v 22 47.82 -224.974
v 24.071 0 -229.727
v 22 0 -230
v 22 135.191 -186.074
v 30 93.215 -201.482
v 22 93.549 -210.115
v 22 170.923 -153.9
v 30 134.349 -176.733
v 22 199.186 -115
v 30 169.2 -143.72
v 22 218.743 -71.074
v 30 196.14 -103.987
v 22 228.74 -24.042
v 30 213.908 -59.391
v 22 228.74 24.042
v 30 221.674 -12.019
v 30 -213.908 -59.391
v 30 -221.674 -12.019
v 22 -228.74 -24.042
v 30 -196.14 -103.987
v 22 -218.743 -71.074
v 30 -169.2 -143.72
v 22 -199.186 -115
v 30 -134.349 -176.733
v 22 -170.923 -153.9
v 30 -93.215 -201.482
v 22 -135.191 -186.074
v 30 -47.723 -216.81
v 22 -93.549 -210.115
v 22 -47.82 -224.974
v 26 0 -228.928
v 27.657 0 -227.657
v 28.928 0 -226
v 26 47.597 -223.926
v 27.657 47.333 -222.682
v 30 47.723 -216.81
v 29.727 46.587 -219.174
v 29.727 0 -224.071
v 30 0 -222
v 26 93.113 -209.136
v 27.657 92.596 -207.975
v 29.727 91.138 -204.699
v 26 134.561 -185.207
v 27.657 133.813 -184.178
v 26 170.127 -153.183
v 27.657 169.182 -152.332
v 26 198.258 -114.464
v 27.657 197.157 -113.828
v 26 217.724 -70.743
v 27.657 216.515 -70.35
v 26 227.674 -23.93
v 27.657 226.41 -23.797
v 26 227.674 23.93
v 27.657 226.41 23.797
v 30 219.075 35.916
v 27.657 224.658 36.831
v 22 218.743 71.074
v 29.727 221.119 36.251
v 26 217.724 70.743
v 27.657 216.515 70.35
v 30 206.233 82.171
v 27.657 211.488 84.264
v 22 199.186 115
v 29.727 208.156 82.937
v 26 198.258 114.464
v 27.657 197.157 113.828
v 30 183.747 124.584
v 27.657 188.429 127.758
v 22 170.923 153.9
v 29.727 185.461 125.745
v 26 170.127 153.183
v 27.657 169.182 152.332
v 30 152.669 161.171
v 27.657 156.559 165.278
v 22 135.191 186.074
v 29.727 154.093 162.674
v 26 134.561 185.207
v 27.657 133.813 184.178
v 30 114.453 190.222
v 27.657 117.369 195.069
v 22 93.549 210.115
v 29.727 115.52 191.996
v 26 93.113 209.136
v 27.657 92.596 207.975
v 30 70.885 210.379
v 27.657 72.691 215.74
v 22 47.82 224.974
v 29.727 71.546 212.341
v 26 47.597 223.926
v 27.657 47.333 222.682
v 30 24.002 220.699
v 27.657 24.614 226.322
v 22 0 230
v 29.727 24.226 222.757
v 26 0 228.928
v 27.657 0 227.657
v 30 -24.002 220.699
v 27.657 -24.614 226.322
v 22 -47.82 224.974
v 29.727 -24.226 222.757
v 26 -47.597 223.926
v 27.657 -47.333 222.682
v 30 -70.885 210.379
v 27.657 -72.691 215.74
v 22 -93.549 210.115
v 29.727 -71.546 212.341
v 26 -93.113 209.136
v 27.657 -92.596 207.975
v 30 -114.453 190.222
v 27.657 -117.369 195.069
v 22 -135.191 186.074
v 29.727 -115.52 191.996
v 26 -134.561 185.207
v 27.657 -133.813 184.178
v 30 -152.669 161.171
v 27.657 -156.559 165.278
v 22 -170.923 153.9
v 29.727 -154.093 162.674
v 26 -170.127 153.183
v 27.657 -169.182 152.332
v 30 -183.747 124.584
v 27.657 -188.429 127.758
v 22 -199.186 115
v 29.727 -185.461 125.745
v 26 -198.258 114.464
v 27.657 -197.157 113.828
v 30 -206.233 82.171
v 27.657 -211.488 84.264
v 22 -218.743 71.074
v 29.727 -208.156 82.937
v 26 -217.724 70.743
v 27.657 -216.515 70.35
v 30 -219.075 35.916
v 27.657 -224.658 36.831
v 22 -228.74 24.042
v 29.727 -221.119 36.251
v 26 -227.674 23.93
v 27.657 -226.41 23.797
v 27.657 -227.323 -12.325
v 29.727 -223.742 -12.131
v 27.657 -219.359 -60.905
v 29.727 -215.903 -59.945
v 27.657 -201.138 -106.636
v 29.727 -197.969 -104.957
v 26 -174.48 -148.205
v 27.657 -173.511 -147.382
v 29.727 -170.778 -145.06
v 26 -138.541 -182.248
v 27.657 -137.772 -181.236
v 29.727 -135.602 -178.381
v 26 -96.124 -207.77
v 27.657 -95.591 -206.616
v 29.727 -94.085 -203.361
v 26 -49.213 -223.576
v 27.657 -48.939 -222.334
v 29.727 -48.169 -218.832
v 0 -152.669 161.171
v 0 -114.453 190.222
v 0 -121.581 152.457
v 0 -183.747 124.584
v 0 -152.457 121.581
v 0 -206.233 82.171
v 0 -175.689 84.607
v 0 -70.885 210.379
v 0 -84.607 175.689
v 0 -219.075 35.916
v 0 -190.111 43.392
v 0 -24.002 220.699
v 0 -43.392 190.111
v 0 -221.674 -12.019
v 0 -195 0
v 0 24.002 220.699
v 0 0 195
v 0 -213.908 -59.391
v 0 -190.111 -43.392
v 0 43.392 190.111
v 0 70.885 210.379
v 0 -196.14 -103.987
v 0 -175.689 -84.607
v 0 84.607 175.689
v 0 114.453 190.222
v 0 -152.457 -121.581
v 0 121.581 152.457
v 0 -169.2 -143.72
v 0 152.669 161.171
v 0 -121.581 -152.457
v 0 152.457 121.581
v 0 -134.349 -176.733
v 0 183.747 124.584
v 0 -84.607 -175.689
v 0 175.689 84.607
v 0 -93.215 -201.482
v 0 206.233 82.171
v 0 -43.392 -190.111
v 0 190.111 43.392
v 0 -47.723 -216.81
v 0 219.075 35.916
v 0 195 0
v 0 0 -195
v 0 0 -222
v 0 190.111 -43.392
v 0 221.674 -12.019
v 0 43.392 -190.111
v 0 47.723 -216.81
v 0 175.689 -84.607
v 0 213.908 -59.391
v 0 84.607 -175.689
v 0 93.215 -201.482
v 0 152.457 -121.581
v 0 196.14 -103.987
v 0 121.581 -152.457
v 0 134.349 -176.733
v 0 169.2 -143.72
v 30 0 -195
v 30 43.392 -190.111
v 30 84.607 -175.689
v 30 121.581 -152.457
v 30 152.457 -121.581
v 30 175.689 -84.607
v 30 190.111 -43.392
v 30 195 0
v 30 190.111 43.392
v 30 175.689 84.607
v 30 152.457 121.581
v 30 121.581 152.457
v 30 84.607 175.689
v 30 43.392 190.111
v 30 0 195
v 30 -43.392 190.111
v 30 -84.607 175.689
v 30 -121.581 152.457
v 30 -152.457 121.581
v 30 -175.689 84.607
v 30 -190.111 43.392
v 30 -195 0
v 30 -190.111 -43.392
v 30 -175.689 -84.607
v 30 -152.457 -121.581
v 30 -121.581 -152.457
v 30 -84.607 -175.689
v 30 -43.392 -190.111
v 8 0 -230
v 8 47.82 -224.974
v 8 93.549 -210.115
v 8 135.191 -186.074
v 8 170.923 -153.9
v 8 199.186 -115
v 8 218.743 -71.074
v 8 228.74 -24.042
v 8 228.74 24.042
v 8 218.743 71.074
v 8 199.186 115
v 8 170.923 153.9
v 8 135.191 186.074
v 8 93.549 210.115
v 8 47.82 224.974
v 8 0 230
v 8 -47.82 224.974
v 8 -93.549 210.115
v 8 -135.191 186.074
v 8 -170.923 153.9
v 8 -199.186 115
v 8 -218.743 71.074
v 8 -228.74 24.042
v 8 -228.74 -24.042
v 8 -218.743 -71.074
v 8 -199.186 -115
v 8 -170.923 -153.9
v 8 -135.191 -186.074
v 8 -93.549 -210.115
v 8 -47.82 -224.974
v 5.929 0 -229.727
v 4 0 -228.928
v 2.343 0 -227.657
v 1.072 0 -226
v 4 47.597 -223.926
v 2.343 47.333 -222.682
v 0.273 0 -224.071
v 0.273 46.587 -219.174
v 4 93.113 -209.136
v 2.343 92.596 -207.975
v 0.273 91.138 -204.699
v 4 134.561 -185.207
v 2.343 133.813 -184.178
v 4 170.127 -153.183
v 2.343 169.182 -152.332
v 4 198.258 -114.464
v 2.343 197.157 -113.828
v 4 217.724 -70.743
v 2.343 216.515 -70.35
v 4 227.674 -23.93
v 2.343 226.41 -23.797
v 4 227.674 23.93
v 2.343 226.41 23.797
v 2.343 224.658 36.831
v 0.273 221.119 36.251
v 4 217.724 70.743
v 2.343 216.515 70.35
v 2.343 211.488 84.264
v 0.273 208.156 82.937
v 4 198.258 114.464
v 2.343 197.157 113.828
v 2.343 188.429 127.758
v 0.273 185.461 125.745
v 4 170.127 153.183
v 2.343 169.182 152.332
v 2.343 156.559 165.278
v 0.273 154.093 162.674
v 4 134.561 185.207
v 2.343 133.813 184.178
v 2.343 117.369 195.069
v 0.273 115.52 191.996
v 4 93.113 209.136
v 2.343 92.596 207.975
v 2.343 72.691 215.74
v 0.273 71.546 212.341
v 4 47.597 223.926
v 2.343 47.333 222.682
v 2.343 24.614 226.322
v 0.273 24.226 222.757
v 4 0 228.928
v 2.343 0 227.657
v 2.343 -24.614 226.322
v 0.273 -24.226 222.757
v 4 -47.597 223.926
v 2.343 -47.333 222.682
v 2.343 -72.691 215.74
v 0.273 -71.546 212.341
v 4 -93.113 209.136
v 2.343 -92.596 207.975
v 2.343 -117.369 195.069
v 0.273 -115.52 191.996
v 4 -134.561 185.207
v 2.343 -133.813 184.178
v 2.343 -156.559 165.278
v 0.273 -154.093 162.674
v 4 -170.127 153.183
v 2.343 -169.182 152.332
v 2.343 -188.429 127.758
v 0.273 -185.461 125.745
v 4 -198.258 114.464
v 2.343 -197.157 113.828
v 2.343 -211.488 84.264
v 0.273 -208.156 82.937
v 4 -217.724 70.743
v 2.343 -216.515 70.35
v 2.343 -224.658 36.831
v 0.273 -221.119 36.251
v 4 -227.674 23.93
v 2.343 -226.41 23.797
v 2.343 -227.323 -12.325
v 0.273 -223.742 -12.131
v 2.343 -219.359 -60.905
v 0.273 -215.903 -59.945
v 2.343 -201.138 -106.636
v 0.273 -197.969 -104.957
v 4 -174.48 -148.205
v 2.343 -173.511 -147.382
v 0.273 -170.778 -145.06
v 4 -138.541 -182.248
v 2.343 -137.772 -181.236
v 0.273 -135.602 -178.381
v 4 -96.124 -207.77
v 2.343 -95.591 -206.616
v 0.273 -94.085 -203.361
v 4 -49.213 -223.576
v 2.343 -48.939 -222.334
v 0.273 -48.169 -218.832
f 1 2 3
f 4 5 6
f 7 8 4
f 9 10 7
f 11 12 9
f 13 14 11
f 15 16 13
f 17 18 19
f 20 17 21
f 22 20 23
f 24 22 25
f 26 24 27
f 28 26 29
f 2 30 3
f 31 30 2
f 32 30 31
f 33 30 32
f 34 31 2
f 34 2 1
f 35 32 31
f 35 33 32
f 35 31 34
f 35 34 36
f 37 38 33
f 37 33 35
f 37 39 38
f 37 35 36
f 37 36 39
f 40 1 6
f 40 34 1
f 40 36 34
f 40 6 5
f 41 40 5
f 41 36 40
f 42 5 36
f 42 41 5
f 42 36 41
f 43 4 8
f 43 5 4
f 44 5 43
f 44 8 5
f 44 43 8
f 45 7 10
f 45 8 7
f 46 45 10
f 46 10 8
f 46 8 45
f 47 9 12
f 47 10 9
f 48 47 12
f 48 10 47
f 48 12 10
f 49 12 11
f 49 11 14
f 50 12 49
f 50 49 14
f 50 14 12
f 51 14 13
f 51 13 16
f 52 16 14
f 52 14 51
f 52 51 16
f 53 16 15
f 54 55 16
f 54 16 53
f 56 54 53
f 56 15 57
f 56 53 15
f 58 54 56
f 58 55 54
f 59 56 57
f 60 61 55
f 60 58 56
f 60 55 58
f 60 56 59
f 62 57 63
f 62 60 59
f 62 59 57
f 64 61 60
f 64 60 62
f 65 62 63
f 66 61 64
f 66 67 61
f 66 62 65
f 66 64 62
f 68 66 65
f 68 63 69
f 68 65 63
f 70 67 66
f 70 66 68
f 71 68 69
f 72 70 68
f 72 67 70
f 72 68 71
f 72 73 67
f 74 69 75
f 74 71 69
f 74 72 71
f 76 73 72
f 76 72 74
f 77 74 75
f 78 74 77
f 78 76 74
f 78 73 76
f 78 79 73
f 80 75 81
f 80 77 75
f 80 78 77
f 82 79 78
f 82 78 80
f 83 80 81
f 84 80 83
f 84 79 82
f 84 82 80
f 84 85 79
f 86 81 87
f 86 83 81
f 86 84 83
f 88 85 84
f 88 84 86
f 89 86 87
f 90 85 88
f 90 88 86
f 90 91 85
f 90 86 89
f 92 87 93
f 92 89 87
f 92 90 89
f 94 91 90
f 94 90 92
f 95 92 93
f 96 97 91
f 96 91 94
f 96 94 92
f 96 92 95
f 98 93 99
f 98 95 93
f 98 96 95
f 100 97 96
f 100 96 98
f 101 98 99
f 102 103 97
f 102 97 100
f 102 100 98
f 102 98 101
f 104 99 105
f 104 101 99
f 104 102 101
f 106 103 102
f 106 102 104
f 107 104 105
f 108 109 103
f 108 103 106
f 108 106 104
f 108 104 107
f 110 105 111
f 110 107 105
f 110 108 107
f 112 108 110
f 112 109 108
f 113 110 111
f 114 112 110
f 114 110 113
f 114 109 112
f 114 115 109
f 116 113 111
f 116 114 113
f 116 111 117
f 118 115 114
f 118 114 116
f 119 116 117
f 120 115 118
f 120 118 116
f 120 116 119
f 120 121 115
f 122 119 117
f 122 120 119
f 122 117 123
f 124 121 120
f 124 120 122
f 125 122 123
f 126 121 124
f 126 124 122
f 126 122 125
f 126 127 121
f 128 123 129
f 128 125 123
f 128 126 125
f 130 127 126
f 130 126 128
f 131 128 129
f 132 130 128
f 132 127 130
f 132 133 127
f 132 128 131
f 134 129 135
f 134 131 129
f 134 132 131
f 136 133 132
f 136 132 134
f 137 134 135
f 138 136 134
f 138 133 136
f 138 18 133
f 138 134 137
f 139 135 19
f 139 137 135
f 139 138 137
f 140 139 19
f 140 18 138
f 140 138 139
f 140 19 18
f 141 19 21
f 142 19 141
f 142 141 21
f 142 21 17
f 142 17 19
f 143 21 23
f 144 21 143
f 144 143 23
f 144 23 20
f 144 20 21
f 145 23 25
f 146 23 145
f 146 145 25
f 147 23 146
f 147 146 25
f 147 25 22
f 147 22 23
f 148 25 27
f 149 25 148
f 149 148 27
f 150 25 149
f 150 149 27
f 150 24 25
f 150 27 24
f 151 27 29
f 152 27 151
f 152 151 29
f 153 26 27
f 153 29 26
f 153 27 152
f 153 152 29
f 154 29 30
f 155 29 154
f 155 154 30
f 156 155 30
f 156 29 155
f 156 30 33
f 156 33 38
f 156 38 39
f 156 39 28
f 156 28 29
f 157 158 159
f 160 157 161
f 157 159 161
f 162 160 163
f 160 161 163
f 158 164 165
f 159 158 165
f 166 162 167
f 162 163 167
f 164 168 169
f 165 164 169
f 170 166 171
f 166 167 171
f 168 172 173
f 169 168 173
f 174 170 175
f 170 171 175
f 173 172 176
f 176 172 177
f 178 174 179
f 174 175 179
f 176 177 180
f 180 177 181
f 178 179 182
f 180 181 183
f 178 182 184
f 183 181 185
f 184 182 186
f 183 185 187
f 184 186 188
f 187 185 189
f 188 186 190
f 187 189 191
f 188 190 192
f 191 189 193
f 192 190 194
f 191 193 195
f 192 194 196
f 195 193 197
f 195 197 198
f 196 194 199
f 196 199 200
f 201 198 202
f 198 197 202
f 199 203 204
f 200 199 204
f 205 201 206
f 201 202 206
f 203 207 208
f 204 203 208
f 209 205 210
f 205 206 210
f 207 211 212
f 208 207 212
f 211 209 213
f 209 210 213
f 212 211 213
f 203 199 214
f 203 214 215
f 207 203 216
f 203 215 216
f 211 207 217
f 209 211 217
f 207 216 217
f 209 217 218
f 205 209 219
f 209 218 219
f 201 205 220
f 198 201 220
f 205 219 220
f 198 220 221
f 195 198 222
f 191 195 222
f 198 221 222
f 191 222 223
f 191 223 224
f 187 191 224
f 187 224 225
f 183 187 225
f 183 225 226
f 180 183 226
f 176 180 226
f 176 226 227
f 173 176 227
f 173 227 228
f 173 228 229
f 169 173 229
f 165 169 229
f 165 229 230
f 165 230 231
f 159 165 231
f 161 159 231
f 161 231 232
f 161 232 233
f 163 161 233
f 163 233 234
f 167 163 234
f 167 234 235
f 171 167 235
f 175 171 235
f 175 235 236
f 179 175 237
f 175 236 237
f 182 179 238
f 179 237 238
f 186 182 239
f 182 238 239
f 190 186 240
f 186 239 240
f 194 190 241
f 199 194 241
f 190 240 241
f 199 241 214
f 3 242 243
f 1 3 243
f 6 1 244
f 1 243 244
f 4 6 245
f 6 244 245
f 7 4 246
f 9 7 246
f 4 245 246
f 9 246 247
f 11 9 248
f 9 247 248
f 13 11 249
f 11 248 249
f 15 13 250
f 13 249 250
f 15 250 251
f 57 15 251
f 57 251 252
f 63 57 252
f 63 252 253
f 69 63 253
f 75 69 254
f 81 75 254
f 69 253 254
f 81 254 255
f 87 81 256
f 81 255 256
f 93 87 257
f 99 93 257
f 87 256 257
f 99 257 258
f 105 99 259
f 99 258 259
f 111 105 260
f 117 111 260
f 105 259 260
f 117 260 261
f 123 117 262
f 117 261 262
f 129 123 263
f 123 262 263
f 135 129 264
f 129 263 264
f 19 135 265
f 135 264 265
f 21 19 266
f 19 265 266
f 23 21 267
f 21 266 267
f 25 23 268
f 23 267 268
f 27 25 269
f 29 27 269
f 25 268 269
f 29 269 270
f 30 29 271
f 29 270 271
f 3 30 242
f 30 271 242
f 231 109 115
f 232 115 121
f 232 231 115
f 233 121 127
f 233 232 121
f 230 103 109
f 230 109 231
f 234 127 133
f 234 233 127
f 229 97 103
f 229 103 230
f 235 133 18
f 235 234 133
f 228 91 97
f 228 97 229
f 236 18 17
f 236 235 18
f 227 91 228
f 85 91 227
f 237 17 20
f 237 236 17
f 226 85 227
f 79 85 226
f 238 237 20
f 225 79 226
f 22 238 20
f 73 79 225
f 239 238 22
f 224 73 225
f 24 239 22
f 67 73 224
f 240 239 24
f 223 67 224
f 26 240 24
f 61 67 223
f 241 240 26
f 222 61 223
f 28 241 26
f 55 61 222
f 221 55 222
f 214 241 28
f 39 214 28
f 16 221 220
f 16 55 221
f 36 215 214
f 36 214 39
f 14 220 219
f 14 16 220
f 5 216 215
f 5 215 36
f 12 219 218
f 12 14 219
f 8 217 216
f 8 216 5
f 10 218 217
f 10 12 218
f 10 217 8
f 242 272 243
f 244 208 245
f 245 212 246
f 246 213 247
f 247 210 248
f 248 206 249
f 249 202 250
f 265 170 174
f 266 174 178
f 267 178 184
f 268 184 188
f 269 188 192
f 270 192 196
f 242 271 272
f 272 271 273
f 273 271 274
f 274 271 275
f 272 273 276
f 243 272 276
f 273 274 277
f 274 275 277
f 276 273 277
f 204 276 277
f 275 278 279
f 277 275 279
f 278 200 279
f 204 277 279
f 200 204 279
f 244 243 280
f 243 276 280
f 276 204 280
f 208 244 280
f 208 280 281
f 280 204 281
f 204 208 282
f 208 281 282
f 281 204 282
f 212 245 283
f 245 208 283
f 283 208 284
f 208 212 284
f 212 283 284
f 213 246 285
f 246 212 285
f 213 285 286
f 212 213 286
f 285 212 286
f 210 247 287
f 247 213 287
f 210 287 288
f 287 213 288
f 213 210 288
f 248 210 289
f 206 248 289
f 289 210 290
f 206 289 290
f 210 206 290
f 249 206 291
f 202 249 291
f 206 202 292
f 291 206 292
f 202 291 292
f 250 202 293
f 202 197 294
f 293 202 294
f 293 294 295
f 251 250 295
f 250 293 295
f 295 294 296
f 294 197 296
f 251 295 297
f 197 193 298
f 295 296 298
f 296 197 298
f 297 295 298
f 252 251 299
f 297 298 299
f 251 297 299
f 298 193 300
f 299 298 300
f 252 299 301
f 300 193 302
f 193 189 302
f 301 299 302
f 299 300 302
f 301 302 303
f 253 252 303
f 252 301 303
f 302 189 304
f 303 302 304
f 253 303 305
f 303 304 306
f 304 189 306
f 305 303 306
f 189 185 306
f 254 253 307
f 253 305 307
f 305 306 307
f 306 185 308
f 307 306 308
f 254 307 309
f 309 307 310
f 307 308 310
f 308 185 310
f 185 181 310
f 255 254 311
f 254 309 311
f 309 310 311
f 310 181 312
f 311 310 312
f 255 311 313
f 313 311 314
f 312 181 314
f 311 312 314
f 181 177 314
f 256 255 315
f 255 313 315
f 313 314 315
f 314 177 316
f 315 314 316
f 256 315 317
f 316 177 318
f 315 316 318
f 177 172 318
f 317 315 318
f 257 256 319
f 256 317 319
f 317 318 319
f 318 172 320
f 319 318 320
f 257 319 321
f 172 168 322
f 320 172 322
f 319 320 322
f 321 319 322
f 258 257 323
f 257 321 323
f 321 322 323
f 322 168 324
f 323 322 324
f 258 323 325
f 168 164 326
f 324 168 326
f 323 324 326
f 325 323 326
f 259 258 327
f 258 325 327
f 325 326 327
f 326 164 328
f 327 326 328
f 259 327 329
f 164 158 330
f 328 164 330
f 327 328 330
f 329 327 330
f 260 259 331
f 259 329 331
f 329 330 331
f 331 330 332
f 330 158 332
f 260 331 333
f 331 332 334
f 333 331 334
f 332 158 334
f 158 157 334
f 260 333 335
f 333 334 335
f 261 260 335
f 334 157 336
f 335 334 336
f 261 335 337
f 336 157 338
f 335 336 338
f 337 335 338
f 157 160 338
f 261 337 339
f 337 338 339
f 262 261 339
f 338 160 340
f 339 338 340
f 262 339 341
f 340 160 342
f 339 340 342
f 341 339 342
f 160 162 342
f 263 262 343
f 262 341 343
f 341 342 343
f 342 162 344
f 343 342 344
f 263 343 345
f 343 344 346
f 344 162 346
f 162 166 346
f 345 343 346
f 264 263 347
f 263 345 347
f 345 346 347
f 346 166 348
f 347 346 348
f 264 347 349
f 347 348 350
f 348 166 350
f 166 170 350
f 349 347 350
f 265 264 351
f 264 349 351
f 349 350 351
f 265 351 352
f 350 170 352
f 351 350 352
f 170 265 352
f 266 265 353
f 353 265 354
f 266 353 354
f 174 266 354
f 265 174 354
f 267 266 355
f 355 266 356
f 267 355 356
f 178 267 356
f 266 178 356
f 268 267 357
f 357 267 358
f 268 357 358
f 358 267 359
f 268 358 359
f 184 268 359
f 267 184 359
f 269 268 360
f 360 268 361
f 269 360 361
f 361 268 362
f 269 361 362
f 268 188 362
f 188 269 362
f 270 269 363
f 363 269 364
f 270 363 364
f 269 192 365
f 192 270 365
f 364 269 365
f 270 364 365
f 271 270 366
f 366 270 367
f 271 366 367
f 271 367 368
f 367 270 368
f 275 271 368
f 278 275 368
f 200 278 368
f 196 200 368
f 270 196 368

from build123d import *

# Parameters (mm, degrees)
SKETCH1_R           = 230
BOSS_EXTRUDE1_DEPTH = 30
FILLET1_R           = 8
SKETCH2_R           = 195
CUT_EXTRUDE1_DEPTH  = 327.649659421


with BuildPart() as part:
    # Sketch1 → Boss-Extrude1 (new body)
    with BuildSketch(Plane(origin=(0, 0, 0), x_dir=(0, 0, -1), z_dir=(1, 0, 0))):
        Circle(SKETCH1_R)
    extrude(amount=BOSS_EXTRUDE1_DEPTH)

    # Fillet1
    fillet1_edges = [part.edges().sort_by_distance(p)[0] for p in [
        (0, 0, 230),
        (30, 0, 230),
    ]]
    fillet(fillet1_edges, radius=FILLET1_R)

    # Sketch2 → Cut-Extrude1 (cut, through all)
    with BuildSketch(Plane(origin=(30, 0, 0), x_dir=(0, 0, -1), z_dir=(1, 0, 0))):
        Circle(SKETCH2_R)
    extrude(amount=-CUT_EXTRUDE1_DEPTH, mode=Mode.SUBTRACT)


solid = part.part
